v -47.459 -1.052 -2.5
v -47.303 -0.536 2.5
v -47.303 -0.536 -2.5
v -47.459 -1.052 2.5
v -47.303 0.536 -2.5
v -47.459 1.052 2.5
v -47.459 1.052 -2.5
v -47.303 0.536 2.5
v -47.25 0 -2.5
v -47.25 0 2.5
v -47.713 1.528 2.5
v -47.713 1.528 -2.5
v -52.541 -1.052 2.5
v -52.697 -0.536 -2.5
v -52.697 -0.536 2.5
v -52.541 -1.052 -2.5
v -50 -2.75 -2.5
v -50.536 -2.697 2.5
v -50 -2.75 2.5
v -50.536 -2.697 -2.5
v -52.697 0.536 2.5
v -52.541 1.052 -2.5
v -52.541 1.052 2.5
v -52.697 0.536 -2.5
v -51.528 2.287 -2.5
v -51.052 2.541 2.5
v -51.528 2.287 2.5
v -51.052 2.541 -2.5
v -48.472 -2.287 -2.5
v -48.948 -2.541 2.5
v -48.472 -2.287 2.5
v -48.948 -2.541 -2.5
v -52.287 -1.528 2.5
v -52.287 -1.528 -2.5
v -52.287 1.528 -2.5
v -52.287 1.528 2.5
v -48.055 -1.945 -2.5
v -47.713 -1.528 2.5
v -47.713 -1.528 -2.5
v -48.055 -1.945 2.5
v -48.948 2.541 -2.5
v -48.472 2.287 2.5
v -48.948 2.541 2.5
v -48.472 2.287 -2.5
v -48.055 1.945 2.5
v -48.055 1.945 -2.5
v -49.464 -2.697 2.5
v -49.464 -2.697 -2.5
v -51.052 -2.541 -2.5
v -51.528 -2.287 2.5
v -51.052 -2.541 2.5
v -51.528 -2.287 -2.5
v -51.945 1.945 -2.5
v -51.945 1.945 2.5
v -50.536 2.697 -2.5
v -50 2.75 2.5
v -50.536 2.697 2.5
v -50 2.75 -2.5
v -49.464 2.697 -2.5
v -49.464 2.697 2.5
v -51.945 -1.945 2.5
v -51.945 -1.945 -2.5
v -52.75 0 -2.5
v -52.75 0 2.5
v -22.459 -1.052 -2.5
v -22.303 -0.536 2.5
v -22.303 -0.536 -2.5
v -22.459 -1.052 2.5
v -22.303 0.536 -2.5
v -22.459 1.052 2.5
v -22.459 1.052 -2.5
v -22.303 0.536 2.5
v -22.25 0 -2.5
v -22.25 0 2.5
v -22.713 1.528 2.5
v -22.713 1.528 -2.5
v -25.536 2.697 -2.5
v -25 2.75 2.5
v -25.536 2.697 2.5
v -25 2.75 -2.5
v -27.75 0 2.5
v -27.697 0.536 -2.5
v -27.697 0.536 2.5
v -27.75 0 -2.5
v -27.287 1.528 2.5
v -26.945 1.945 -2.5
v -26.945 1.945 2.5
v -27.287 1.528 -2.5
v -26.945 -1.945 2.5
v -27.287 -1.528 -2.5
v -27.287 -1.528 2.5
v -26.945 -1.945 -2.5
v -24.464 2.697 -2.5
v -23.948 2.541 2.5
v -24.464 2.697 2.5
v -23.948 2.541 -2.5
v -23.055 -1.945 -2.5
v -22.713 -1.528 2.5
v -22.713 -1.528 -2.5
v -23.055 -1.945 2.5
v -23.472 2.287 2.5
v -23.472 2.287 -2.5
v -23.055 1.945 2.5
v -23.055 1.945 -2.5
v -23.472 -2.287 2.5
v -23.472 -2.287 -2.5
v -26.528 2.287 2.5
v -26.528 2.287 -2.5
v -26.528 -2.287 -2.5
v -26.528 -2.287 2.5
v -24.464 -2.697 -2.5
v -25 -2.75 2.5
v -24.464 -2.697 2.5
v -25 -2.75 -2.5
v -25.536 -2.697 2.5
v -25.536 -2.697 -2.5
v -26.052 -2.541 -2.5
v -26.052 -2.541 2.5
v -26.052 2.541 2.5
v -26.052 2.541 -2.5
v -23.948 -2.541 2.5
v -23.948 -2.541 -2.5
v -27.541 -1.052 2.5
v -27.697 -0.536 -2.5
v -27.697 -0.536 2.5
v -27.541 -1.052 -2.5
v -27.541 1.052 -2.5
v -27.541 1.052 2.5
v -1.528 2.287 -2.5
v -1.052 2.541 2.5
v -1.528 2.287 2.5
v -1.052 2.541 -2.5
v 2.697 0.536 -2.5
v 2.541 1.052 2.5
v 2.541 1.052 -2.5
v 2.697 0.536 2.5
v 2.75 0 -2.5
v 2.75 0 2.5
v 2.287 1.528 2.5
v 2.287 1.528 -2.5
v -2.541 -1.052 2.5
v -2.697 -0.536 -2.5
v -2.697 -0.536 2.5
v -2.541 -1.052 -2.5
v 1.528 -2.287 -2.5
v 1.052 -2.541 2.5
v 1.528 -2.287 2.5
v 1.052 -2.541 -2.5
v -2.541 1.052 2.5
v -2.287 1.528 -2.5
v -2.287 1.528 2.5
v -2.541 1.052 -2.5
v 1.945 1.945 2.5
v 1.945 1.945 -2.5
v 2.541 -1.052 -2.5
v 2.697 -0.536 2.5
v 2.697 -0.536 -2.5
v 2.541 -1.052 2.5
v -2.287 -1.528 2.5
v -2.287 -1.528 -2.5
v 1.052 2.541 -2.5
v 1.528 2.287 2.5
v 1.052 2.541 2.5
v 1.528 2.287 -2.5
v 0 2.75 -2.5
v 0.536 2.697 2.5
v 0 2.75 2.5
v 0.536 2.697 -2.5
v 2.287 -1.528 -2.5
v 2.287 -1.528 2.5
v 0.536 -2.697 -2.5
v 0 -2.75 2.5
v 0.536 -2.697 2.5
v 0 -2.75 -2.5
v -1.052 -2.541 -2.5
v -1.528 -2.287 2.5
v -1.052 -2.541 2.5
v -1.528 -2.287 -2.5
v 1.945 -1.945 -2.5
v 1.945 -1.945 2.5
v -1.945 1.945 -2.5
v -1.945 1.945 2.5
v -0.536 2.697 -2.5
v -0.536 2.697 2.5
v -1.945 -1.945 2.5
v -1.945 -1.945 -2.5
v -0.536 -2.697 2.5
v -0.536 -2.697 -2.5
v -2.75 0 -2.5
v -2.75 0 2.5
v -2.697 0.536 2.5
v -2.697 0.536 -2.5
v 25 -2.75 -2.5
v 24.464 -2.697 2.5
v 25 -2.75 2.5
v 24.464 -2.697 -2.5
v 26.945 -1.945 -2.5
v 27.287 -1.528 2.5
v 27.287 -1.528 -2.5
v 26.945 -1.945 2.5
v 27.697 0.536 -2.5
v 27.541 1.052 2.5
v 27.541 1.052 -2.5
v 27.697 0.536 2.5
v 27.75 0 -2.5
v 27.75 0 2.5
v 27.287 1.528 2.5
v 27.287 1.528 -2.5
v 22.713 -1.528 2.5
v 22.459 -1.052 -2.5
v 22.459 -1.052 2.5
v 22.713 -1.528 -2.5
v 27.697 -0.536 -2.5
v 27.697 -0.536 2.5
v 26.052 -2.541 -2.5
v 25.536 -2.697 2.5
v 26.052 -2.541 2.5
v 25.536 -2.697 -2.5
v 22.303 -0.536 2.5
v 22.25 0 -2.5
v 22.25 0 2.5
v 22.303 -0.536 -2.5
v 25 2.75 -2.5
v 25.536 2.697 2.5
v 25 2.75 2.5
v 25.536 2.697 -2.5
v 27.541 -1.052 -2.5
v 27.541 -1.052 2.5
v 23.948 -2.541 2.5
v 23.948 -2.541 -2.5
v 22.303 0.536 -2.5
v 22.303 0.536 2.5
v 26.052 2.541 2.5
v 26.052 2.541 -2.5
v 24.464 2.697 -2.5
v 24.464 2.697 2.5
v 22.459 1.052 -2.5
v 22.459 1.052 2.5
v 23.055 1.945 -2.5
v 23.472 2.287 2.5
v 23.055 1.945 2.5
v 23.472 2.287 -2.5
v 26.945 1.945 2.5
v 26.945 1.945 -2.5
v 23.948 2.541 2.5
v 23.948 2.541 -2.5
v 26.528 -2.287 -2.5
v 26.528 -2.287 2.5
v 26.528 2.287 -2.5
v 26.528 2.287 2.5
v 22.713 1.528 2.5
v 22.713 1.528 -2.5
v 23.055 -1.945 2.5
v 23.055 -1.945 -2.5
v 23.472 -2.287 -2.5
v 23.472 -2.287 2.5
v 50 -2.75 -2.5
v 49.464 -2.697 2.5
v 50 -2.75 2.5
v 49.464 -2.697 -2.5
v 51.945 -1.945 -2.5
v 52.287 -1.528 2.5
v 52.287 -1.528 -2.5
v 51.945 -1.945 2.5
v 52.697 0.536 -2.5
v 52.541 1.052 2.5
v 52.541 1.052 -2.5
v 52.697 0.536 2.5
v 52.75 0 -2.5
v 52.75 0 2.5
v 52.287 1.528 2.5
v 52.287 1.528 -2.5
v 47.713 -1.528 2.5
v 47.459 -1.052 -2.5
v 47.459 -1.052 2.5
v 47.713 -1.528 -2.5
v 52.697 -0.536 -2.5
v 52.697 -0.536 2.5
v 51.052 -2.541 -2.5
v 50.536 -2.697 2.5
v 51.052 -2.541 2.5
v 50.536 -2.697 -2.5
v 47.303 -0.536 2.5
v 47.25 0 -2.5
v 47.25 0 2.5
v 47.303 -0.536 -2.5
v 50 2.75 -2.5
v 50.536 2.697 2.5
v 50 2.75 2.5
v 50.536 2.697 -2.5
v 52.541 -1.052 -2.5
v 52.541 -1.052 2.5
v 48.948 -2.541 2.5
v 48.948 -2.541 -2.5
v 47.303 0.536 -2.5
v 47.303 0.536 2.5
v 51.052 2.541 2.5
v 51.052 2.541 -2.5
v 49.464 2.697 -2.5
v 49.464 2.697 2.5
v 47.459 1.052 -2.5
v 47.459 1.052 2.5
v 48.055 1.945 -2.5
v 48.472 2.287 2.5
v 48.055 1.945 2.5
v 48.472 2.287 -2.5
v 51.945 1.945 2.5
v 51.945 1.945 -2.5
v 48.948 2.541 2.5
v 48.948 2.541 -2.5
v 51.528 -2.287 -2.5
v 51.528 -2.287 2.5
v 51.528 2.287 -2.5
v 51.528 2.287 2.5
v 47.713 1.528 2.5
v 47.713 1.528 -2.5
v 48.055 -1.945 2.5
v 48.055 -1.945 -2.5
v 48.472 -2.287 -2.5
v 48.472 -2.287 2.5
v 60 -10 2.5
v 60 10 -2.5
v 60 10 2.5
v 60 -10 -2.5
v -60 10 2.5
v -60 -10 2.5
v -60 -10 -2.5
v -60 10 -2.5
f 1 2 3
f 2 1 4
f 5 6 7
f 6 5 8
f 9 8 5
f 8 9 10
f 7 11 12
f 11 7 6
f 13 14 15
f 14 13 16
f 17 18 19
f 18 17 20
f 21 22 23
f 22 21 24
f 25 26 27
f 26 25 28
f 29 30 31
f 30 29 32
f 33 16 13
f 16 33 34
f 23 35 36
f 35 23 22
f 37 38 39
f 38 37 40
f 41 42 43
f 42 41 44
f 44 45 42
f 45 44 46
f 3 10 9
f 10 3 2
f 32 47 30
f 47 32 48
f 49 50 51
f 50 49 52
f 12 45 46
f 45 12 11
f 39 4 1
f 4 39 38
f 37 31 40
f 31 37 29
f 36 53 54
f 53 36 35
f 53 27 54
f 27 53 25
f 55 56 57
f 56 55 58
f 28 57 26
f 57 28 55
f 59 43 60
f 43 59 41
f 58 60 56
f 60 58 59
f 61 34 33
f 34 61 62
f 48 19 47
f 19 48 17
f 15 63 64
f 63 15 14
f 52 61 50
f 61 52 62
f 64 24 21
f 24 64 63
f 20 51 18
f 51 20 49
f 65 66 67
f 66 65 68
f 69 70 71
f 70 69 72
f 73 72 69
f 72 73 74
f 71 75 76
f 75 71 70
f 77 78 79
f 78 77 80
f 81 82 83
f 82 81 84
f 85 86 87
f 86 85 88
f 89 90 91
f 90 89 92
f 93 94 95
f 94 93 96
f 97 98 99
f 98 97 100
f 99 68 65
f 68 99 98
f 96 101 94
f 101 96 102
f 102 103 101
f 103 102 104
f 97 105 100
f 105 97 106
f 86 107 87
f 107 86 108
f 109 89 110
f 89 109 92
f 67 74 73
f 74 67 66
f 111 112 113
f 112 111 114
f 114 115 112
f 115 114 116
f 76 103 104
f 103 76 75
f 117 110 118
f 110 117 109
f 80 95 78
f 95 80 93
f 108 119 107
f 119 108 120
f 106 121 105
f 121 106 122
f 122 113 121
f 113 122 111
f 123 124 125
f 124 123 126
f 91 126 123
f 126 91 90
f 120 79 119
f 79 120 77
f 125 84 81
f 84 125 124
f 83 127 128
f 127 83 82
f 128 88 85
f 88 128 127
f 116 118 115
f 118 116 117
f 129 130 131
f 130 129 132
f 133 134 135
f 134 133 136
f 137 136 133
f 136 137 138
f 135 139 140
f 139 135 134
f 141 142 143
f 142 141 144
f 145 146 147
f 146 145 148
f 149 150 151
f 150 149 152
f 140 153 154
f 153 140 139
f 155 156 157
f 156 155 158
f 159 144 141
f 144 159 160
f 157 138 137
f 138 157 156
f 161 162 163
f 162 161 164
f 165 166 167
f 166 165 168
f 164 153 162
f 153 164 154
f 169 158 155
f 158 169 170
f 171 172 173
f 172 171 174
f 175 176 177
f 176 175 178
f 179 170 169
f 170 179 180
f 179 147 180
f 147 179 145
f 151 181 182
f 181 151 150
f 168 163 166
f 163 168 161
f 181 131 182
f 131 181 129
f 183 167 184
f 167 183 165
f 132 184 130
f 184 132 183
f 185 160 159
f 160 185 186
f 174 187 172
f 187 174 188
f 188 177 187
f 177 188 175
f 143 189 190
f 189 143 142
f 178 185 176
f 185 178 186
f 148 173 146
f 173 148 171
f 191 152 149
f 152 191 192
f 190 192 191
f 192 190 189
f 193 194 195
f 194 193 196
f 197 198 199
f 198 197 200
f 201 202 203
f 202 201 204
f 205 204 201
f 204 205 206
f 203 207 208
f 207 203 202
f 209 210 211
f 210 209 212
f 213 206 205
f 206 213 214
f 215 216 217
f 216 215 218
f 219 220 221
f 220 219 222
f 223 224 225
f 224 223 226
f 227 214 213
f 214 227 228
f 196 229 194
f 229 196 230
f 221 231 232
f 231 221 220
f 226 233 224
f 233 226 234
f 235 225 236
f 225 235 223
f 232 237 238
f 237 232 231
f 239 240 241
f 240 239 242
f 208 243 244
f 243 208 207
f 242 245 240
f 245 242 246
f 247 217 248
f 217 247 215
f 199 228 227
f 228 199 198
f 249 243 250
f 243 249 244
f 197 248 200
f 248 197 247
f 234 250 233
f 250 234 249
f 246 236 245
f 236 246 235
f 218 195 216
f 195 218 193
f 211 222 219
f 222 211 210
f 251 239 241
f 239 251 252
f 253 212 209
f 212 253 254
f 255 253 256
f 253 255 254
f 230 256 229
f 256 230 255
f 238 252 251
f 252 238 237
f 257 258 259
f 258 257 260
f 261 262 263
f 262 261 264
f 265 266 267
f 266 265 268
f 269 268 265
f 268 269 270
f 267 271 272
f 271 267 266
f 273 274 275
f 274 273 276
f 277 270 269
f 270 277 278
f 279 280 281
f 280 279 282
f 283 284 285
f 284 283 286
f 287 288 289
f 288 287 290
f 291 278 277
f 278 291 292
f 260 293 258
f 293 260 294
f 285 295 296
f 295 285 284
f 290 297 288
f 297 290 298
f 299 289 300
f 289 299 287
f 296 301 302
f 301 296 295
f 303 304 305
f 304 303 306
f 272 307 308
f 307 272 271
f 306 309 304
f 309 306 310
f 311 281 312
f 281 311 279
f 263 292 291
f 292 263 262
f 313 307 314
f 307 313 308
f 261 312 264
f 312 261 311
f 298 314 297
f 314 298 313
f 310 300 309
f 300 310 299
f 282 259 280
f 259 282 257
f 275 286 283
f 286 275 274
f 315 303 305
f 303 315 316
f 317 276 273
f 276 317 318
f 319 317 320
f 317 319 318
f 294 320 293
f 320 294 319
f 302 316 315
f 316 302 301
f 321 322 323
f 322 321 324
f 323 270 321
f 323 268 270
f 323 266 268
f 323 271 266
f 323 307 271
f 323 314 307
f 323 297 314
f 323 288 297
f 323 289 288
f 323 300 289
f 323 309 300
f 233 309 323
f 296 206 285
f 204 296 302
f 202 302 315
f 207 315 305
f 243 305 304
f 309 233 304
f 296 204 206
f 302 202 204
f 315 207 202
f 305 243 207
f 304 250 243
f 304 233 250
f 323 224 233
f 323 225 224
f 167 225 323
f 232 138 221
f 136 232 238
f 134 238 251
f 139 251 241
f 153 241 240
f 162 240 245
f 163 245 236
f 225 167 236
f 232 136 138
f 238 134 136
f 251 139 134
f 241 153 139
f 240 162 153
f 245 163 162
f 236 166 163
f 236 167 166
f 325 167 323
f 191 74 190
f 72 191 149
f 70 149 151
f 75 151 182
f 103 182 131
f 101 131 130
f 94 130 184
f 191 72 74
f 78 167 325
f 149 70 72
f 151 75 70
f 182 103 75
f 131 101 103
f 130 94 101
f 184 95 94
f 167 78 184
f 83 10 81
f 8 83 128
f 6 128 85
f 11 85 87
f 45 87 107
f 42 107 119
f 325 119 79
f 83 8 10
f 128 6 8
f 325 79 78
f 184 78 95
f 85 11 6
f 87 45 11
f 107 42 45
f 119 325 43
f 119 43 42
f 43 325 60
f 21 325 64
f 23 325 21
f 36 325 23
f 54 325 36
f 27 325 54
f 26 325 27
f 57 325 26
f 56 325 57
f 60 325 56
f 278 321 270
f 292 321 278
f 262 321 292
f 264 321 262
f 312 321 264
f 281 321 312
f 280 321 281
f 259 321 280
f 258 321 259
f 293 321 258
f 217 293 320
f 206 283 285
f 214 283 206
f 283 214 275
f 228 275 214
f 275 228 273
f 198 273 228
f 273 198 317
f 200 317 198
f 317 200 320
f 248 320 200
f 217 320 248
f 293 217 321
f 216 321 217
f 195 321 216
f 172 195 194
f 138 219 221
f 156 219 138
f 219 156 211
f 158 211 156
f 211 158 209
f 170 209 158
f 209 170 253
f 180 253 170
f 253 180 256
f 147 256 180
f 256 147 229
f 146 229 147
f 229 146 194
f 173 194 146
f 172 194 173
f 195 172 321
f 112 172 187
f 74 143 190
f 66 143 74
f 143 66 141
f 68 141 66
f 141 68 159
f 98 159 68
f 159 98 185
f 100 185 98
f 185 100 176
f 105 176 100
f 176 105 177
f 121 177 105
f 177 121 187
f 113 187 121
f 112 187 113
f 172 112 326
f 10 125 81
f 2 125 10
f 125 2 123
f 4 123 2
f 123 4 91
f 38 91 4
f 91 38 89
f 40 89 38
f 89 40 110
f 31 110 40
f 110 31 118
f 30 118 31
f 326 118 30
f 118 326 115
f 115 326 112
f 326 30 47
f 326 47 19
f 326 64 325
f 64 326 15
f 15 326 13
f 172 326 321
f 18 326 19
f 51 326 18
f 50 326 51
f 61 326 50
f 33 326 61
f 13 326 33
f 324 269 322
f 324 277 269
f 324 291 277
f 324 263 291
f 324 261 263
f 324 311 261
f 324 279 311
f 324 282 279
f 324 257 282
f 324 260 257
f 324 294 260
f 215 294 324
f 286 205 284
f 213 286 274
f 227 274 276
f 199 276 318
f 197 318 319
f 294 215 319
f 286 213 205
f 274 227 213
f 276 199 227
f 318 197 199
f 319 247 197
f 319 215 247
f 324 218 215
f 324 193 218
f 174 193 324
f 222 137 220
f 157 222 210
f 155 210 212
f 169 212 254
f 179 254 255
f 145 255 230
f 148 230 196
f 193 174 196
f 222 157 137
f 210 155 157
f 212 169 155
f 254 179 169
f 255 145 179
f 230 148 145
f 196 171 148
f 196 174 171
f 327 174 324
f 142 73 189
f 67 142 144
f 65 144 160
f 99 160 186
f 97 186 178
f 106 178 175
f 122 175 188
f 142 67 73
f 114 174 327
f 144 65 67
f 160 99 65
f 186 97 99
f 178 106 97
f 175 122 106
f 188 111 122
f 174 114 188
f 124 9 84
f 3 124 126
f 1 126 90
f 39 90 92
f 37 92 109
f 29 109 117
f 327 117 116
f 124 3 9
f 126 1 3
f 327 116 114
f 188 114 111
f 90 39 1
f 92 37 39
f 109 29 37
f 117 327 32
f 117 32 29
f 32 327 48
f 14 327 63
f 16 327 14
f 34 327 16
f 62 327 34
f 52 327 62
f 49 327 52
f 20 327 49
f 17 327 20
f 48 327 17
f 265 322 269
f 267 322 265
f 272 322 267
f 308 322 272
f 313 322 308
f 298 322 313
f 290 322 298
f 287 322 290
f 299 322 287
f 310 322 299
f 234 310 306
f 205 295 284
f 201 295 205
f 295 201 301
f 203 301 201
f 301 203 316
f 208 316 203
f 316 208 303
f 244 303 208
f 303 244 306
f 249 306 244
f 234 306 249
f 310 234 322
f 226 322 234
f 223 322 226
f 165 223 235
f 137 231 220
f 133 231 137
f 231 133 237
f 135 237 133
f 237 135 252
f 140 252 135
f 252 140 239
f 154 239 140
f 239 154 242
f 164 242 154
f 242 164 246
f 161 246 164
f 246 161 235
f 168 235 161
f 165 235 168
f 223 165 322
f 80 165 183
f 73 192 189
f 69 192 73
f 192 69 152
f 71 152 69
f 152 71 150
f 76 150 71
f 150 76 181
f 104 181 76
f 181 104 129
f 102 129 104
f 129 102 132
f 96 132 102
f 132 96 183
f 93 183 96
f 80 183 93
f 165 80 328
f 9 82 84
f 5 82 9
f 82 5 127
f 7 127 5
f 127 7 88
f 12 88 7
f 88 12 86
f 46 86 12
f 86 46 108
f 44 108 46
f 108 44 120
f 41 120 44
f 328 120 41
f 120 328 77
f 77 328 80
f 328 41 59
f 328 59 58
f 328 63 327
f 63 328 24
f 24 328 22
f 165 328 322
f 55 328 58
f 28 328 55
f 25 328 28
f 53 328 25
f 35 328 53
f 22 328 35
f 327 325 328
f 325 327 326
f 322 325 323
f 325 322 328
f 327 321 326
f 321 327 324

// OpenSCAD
$fn = 32;

// ----------------------------------------------------------------------
// Hole bar, 5 x Ø5.5
// row layout, 10 mm edge offset
// ----------------------------------------------------------------------

// --- parameters (mm) ---
bar_w = 20;    // bar width (Y)
bar_t = 5;     // bar thickness (Z)
holes = 5;     // holes per row
hole_d = 5.5;  // hole diameter
edge = 10;     // offset from the bar end to the first hole
pitch = 25;    // pitch between neighbouring holes

// --- derived feature positions (mm) ---
span = (holes - 1) * pitch;   // = 100   distance between the end holes
bar_l = span + 2 * edge;      // = 120   overall bar length
start_x = -bar_l / 2 + edge;  // = -50   X of the first hole
feature_centers = [
  [start_x + 0 * pitch, 0],
  [start_x + 1 * pitch, 0],
  [start_x + 2 * pitch, 0],
  [start_x + 3 * pitch, 0],
  [start_x + 4 * pitch, 0]
];   // hole centres of the first row

// bar with one row of holes, drilled from feature_centers
difference() {
  translate([-bar_l / 2, -bar_w / 2, -bar_t / 2]) cube([bar_l, bar_w, bar_t]);
  for (centre = feature_centers)
    translate([centre[0], centre[1], 0])
      cylinder(d = hole_d, h = bar_t + 2, center = true);
}
